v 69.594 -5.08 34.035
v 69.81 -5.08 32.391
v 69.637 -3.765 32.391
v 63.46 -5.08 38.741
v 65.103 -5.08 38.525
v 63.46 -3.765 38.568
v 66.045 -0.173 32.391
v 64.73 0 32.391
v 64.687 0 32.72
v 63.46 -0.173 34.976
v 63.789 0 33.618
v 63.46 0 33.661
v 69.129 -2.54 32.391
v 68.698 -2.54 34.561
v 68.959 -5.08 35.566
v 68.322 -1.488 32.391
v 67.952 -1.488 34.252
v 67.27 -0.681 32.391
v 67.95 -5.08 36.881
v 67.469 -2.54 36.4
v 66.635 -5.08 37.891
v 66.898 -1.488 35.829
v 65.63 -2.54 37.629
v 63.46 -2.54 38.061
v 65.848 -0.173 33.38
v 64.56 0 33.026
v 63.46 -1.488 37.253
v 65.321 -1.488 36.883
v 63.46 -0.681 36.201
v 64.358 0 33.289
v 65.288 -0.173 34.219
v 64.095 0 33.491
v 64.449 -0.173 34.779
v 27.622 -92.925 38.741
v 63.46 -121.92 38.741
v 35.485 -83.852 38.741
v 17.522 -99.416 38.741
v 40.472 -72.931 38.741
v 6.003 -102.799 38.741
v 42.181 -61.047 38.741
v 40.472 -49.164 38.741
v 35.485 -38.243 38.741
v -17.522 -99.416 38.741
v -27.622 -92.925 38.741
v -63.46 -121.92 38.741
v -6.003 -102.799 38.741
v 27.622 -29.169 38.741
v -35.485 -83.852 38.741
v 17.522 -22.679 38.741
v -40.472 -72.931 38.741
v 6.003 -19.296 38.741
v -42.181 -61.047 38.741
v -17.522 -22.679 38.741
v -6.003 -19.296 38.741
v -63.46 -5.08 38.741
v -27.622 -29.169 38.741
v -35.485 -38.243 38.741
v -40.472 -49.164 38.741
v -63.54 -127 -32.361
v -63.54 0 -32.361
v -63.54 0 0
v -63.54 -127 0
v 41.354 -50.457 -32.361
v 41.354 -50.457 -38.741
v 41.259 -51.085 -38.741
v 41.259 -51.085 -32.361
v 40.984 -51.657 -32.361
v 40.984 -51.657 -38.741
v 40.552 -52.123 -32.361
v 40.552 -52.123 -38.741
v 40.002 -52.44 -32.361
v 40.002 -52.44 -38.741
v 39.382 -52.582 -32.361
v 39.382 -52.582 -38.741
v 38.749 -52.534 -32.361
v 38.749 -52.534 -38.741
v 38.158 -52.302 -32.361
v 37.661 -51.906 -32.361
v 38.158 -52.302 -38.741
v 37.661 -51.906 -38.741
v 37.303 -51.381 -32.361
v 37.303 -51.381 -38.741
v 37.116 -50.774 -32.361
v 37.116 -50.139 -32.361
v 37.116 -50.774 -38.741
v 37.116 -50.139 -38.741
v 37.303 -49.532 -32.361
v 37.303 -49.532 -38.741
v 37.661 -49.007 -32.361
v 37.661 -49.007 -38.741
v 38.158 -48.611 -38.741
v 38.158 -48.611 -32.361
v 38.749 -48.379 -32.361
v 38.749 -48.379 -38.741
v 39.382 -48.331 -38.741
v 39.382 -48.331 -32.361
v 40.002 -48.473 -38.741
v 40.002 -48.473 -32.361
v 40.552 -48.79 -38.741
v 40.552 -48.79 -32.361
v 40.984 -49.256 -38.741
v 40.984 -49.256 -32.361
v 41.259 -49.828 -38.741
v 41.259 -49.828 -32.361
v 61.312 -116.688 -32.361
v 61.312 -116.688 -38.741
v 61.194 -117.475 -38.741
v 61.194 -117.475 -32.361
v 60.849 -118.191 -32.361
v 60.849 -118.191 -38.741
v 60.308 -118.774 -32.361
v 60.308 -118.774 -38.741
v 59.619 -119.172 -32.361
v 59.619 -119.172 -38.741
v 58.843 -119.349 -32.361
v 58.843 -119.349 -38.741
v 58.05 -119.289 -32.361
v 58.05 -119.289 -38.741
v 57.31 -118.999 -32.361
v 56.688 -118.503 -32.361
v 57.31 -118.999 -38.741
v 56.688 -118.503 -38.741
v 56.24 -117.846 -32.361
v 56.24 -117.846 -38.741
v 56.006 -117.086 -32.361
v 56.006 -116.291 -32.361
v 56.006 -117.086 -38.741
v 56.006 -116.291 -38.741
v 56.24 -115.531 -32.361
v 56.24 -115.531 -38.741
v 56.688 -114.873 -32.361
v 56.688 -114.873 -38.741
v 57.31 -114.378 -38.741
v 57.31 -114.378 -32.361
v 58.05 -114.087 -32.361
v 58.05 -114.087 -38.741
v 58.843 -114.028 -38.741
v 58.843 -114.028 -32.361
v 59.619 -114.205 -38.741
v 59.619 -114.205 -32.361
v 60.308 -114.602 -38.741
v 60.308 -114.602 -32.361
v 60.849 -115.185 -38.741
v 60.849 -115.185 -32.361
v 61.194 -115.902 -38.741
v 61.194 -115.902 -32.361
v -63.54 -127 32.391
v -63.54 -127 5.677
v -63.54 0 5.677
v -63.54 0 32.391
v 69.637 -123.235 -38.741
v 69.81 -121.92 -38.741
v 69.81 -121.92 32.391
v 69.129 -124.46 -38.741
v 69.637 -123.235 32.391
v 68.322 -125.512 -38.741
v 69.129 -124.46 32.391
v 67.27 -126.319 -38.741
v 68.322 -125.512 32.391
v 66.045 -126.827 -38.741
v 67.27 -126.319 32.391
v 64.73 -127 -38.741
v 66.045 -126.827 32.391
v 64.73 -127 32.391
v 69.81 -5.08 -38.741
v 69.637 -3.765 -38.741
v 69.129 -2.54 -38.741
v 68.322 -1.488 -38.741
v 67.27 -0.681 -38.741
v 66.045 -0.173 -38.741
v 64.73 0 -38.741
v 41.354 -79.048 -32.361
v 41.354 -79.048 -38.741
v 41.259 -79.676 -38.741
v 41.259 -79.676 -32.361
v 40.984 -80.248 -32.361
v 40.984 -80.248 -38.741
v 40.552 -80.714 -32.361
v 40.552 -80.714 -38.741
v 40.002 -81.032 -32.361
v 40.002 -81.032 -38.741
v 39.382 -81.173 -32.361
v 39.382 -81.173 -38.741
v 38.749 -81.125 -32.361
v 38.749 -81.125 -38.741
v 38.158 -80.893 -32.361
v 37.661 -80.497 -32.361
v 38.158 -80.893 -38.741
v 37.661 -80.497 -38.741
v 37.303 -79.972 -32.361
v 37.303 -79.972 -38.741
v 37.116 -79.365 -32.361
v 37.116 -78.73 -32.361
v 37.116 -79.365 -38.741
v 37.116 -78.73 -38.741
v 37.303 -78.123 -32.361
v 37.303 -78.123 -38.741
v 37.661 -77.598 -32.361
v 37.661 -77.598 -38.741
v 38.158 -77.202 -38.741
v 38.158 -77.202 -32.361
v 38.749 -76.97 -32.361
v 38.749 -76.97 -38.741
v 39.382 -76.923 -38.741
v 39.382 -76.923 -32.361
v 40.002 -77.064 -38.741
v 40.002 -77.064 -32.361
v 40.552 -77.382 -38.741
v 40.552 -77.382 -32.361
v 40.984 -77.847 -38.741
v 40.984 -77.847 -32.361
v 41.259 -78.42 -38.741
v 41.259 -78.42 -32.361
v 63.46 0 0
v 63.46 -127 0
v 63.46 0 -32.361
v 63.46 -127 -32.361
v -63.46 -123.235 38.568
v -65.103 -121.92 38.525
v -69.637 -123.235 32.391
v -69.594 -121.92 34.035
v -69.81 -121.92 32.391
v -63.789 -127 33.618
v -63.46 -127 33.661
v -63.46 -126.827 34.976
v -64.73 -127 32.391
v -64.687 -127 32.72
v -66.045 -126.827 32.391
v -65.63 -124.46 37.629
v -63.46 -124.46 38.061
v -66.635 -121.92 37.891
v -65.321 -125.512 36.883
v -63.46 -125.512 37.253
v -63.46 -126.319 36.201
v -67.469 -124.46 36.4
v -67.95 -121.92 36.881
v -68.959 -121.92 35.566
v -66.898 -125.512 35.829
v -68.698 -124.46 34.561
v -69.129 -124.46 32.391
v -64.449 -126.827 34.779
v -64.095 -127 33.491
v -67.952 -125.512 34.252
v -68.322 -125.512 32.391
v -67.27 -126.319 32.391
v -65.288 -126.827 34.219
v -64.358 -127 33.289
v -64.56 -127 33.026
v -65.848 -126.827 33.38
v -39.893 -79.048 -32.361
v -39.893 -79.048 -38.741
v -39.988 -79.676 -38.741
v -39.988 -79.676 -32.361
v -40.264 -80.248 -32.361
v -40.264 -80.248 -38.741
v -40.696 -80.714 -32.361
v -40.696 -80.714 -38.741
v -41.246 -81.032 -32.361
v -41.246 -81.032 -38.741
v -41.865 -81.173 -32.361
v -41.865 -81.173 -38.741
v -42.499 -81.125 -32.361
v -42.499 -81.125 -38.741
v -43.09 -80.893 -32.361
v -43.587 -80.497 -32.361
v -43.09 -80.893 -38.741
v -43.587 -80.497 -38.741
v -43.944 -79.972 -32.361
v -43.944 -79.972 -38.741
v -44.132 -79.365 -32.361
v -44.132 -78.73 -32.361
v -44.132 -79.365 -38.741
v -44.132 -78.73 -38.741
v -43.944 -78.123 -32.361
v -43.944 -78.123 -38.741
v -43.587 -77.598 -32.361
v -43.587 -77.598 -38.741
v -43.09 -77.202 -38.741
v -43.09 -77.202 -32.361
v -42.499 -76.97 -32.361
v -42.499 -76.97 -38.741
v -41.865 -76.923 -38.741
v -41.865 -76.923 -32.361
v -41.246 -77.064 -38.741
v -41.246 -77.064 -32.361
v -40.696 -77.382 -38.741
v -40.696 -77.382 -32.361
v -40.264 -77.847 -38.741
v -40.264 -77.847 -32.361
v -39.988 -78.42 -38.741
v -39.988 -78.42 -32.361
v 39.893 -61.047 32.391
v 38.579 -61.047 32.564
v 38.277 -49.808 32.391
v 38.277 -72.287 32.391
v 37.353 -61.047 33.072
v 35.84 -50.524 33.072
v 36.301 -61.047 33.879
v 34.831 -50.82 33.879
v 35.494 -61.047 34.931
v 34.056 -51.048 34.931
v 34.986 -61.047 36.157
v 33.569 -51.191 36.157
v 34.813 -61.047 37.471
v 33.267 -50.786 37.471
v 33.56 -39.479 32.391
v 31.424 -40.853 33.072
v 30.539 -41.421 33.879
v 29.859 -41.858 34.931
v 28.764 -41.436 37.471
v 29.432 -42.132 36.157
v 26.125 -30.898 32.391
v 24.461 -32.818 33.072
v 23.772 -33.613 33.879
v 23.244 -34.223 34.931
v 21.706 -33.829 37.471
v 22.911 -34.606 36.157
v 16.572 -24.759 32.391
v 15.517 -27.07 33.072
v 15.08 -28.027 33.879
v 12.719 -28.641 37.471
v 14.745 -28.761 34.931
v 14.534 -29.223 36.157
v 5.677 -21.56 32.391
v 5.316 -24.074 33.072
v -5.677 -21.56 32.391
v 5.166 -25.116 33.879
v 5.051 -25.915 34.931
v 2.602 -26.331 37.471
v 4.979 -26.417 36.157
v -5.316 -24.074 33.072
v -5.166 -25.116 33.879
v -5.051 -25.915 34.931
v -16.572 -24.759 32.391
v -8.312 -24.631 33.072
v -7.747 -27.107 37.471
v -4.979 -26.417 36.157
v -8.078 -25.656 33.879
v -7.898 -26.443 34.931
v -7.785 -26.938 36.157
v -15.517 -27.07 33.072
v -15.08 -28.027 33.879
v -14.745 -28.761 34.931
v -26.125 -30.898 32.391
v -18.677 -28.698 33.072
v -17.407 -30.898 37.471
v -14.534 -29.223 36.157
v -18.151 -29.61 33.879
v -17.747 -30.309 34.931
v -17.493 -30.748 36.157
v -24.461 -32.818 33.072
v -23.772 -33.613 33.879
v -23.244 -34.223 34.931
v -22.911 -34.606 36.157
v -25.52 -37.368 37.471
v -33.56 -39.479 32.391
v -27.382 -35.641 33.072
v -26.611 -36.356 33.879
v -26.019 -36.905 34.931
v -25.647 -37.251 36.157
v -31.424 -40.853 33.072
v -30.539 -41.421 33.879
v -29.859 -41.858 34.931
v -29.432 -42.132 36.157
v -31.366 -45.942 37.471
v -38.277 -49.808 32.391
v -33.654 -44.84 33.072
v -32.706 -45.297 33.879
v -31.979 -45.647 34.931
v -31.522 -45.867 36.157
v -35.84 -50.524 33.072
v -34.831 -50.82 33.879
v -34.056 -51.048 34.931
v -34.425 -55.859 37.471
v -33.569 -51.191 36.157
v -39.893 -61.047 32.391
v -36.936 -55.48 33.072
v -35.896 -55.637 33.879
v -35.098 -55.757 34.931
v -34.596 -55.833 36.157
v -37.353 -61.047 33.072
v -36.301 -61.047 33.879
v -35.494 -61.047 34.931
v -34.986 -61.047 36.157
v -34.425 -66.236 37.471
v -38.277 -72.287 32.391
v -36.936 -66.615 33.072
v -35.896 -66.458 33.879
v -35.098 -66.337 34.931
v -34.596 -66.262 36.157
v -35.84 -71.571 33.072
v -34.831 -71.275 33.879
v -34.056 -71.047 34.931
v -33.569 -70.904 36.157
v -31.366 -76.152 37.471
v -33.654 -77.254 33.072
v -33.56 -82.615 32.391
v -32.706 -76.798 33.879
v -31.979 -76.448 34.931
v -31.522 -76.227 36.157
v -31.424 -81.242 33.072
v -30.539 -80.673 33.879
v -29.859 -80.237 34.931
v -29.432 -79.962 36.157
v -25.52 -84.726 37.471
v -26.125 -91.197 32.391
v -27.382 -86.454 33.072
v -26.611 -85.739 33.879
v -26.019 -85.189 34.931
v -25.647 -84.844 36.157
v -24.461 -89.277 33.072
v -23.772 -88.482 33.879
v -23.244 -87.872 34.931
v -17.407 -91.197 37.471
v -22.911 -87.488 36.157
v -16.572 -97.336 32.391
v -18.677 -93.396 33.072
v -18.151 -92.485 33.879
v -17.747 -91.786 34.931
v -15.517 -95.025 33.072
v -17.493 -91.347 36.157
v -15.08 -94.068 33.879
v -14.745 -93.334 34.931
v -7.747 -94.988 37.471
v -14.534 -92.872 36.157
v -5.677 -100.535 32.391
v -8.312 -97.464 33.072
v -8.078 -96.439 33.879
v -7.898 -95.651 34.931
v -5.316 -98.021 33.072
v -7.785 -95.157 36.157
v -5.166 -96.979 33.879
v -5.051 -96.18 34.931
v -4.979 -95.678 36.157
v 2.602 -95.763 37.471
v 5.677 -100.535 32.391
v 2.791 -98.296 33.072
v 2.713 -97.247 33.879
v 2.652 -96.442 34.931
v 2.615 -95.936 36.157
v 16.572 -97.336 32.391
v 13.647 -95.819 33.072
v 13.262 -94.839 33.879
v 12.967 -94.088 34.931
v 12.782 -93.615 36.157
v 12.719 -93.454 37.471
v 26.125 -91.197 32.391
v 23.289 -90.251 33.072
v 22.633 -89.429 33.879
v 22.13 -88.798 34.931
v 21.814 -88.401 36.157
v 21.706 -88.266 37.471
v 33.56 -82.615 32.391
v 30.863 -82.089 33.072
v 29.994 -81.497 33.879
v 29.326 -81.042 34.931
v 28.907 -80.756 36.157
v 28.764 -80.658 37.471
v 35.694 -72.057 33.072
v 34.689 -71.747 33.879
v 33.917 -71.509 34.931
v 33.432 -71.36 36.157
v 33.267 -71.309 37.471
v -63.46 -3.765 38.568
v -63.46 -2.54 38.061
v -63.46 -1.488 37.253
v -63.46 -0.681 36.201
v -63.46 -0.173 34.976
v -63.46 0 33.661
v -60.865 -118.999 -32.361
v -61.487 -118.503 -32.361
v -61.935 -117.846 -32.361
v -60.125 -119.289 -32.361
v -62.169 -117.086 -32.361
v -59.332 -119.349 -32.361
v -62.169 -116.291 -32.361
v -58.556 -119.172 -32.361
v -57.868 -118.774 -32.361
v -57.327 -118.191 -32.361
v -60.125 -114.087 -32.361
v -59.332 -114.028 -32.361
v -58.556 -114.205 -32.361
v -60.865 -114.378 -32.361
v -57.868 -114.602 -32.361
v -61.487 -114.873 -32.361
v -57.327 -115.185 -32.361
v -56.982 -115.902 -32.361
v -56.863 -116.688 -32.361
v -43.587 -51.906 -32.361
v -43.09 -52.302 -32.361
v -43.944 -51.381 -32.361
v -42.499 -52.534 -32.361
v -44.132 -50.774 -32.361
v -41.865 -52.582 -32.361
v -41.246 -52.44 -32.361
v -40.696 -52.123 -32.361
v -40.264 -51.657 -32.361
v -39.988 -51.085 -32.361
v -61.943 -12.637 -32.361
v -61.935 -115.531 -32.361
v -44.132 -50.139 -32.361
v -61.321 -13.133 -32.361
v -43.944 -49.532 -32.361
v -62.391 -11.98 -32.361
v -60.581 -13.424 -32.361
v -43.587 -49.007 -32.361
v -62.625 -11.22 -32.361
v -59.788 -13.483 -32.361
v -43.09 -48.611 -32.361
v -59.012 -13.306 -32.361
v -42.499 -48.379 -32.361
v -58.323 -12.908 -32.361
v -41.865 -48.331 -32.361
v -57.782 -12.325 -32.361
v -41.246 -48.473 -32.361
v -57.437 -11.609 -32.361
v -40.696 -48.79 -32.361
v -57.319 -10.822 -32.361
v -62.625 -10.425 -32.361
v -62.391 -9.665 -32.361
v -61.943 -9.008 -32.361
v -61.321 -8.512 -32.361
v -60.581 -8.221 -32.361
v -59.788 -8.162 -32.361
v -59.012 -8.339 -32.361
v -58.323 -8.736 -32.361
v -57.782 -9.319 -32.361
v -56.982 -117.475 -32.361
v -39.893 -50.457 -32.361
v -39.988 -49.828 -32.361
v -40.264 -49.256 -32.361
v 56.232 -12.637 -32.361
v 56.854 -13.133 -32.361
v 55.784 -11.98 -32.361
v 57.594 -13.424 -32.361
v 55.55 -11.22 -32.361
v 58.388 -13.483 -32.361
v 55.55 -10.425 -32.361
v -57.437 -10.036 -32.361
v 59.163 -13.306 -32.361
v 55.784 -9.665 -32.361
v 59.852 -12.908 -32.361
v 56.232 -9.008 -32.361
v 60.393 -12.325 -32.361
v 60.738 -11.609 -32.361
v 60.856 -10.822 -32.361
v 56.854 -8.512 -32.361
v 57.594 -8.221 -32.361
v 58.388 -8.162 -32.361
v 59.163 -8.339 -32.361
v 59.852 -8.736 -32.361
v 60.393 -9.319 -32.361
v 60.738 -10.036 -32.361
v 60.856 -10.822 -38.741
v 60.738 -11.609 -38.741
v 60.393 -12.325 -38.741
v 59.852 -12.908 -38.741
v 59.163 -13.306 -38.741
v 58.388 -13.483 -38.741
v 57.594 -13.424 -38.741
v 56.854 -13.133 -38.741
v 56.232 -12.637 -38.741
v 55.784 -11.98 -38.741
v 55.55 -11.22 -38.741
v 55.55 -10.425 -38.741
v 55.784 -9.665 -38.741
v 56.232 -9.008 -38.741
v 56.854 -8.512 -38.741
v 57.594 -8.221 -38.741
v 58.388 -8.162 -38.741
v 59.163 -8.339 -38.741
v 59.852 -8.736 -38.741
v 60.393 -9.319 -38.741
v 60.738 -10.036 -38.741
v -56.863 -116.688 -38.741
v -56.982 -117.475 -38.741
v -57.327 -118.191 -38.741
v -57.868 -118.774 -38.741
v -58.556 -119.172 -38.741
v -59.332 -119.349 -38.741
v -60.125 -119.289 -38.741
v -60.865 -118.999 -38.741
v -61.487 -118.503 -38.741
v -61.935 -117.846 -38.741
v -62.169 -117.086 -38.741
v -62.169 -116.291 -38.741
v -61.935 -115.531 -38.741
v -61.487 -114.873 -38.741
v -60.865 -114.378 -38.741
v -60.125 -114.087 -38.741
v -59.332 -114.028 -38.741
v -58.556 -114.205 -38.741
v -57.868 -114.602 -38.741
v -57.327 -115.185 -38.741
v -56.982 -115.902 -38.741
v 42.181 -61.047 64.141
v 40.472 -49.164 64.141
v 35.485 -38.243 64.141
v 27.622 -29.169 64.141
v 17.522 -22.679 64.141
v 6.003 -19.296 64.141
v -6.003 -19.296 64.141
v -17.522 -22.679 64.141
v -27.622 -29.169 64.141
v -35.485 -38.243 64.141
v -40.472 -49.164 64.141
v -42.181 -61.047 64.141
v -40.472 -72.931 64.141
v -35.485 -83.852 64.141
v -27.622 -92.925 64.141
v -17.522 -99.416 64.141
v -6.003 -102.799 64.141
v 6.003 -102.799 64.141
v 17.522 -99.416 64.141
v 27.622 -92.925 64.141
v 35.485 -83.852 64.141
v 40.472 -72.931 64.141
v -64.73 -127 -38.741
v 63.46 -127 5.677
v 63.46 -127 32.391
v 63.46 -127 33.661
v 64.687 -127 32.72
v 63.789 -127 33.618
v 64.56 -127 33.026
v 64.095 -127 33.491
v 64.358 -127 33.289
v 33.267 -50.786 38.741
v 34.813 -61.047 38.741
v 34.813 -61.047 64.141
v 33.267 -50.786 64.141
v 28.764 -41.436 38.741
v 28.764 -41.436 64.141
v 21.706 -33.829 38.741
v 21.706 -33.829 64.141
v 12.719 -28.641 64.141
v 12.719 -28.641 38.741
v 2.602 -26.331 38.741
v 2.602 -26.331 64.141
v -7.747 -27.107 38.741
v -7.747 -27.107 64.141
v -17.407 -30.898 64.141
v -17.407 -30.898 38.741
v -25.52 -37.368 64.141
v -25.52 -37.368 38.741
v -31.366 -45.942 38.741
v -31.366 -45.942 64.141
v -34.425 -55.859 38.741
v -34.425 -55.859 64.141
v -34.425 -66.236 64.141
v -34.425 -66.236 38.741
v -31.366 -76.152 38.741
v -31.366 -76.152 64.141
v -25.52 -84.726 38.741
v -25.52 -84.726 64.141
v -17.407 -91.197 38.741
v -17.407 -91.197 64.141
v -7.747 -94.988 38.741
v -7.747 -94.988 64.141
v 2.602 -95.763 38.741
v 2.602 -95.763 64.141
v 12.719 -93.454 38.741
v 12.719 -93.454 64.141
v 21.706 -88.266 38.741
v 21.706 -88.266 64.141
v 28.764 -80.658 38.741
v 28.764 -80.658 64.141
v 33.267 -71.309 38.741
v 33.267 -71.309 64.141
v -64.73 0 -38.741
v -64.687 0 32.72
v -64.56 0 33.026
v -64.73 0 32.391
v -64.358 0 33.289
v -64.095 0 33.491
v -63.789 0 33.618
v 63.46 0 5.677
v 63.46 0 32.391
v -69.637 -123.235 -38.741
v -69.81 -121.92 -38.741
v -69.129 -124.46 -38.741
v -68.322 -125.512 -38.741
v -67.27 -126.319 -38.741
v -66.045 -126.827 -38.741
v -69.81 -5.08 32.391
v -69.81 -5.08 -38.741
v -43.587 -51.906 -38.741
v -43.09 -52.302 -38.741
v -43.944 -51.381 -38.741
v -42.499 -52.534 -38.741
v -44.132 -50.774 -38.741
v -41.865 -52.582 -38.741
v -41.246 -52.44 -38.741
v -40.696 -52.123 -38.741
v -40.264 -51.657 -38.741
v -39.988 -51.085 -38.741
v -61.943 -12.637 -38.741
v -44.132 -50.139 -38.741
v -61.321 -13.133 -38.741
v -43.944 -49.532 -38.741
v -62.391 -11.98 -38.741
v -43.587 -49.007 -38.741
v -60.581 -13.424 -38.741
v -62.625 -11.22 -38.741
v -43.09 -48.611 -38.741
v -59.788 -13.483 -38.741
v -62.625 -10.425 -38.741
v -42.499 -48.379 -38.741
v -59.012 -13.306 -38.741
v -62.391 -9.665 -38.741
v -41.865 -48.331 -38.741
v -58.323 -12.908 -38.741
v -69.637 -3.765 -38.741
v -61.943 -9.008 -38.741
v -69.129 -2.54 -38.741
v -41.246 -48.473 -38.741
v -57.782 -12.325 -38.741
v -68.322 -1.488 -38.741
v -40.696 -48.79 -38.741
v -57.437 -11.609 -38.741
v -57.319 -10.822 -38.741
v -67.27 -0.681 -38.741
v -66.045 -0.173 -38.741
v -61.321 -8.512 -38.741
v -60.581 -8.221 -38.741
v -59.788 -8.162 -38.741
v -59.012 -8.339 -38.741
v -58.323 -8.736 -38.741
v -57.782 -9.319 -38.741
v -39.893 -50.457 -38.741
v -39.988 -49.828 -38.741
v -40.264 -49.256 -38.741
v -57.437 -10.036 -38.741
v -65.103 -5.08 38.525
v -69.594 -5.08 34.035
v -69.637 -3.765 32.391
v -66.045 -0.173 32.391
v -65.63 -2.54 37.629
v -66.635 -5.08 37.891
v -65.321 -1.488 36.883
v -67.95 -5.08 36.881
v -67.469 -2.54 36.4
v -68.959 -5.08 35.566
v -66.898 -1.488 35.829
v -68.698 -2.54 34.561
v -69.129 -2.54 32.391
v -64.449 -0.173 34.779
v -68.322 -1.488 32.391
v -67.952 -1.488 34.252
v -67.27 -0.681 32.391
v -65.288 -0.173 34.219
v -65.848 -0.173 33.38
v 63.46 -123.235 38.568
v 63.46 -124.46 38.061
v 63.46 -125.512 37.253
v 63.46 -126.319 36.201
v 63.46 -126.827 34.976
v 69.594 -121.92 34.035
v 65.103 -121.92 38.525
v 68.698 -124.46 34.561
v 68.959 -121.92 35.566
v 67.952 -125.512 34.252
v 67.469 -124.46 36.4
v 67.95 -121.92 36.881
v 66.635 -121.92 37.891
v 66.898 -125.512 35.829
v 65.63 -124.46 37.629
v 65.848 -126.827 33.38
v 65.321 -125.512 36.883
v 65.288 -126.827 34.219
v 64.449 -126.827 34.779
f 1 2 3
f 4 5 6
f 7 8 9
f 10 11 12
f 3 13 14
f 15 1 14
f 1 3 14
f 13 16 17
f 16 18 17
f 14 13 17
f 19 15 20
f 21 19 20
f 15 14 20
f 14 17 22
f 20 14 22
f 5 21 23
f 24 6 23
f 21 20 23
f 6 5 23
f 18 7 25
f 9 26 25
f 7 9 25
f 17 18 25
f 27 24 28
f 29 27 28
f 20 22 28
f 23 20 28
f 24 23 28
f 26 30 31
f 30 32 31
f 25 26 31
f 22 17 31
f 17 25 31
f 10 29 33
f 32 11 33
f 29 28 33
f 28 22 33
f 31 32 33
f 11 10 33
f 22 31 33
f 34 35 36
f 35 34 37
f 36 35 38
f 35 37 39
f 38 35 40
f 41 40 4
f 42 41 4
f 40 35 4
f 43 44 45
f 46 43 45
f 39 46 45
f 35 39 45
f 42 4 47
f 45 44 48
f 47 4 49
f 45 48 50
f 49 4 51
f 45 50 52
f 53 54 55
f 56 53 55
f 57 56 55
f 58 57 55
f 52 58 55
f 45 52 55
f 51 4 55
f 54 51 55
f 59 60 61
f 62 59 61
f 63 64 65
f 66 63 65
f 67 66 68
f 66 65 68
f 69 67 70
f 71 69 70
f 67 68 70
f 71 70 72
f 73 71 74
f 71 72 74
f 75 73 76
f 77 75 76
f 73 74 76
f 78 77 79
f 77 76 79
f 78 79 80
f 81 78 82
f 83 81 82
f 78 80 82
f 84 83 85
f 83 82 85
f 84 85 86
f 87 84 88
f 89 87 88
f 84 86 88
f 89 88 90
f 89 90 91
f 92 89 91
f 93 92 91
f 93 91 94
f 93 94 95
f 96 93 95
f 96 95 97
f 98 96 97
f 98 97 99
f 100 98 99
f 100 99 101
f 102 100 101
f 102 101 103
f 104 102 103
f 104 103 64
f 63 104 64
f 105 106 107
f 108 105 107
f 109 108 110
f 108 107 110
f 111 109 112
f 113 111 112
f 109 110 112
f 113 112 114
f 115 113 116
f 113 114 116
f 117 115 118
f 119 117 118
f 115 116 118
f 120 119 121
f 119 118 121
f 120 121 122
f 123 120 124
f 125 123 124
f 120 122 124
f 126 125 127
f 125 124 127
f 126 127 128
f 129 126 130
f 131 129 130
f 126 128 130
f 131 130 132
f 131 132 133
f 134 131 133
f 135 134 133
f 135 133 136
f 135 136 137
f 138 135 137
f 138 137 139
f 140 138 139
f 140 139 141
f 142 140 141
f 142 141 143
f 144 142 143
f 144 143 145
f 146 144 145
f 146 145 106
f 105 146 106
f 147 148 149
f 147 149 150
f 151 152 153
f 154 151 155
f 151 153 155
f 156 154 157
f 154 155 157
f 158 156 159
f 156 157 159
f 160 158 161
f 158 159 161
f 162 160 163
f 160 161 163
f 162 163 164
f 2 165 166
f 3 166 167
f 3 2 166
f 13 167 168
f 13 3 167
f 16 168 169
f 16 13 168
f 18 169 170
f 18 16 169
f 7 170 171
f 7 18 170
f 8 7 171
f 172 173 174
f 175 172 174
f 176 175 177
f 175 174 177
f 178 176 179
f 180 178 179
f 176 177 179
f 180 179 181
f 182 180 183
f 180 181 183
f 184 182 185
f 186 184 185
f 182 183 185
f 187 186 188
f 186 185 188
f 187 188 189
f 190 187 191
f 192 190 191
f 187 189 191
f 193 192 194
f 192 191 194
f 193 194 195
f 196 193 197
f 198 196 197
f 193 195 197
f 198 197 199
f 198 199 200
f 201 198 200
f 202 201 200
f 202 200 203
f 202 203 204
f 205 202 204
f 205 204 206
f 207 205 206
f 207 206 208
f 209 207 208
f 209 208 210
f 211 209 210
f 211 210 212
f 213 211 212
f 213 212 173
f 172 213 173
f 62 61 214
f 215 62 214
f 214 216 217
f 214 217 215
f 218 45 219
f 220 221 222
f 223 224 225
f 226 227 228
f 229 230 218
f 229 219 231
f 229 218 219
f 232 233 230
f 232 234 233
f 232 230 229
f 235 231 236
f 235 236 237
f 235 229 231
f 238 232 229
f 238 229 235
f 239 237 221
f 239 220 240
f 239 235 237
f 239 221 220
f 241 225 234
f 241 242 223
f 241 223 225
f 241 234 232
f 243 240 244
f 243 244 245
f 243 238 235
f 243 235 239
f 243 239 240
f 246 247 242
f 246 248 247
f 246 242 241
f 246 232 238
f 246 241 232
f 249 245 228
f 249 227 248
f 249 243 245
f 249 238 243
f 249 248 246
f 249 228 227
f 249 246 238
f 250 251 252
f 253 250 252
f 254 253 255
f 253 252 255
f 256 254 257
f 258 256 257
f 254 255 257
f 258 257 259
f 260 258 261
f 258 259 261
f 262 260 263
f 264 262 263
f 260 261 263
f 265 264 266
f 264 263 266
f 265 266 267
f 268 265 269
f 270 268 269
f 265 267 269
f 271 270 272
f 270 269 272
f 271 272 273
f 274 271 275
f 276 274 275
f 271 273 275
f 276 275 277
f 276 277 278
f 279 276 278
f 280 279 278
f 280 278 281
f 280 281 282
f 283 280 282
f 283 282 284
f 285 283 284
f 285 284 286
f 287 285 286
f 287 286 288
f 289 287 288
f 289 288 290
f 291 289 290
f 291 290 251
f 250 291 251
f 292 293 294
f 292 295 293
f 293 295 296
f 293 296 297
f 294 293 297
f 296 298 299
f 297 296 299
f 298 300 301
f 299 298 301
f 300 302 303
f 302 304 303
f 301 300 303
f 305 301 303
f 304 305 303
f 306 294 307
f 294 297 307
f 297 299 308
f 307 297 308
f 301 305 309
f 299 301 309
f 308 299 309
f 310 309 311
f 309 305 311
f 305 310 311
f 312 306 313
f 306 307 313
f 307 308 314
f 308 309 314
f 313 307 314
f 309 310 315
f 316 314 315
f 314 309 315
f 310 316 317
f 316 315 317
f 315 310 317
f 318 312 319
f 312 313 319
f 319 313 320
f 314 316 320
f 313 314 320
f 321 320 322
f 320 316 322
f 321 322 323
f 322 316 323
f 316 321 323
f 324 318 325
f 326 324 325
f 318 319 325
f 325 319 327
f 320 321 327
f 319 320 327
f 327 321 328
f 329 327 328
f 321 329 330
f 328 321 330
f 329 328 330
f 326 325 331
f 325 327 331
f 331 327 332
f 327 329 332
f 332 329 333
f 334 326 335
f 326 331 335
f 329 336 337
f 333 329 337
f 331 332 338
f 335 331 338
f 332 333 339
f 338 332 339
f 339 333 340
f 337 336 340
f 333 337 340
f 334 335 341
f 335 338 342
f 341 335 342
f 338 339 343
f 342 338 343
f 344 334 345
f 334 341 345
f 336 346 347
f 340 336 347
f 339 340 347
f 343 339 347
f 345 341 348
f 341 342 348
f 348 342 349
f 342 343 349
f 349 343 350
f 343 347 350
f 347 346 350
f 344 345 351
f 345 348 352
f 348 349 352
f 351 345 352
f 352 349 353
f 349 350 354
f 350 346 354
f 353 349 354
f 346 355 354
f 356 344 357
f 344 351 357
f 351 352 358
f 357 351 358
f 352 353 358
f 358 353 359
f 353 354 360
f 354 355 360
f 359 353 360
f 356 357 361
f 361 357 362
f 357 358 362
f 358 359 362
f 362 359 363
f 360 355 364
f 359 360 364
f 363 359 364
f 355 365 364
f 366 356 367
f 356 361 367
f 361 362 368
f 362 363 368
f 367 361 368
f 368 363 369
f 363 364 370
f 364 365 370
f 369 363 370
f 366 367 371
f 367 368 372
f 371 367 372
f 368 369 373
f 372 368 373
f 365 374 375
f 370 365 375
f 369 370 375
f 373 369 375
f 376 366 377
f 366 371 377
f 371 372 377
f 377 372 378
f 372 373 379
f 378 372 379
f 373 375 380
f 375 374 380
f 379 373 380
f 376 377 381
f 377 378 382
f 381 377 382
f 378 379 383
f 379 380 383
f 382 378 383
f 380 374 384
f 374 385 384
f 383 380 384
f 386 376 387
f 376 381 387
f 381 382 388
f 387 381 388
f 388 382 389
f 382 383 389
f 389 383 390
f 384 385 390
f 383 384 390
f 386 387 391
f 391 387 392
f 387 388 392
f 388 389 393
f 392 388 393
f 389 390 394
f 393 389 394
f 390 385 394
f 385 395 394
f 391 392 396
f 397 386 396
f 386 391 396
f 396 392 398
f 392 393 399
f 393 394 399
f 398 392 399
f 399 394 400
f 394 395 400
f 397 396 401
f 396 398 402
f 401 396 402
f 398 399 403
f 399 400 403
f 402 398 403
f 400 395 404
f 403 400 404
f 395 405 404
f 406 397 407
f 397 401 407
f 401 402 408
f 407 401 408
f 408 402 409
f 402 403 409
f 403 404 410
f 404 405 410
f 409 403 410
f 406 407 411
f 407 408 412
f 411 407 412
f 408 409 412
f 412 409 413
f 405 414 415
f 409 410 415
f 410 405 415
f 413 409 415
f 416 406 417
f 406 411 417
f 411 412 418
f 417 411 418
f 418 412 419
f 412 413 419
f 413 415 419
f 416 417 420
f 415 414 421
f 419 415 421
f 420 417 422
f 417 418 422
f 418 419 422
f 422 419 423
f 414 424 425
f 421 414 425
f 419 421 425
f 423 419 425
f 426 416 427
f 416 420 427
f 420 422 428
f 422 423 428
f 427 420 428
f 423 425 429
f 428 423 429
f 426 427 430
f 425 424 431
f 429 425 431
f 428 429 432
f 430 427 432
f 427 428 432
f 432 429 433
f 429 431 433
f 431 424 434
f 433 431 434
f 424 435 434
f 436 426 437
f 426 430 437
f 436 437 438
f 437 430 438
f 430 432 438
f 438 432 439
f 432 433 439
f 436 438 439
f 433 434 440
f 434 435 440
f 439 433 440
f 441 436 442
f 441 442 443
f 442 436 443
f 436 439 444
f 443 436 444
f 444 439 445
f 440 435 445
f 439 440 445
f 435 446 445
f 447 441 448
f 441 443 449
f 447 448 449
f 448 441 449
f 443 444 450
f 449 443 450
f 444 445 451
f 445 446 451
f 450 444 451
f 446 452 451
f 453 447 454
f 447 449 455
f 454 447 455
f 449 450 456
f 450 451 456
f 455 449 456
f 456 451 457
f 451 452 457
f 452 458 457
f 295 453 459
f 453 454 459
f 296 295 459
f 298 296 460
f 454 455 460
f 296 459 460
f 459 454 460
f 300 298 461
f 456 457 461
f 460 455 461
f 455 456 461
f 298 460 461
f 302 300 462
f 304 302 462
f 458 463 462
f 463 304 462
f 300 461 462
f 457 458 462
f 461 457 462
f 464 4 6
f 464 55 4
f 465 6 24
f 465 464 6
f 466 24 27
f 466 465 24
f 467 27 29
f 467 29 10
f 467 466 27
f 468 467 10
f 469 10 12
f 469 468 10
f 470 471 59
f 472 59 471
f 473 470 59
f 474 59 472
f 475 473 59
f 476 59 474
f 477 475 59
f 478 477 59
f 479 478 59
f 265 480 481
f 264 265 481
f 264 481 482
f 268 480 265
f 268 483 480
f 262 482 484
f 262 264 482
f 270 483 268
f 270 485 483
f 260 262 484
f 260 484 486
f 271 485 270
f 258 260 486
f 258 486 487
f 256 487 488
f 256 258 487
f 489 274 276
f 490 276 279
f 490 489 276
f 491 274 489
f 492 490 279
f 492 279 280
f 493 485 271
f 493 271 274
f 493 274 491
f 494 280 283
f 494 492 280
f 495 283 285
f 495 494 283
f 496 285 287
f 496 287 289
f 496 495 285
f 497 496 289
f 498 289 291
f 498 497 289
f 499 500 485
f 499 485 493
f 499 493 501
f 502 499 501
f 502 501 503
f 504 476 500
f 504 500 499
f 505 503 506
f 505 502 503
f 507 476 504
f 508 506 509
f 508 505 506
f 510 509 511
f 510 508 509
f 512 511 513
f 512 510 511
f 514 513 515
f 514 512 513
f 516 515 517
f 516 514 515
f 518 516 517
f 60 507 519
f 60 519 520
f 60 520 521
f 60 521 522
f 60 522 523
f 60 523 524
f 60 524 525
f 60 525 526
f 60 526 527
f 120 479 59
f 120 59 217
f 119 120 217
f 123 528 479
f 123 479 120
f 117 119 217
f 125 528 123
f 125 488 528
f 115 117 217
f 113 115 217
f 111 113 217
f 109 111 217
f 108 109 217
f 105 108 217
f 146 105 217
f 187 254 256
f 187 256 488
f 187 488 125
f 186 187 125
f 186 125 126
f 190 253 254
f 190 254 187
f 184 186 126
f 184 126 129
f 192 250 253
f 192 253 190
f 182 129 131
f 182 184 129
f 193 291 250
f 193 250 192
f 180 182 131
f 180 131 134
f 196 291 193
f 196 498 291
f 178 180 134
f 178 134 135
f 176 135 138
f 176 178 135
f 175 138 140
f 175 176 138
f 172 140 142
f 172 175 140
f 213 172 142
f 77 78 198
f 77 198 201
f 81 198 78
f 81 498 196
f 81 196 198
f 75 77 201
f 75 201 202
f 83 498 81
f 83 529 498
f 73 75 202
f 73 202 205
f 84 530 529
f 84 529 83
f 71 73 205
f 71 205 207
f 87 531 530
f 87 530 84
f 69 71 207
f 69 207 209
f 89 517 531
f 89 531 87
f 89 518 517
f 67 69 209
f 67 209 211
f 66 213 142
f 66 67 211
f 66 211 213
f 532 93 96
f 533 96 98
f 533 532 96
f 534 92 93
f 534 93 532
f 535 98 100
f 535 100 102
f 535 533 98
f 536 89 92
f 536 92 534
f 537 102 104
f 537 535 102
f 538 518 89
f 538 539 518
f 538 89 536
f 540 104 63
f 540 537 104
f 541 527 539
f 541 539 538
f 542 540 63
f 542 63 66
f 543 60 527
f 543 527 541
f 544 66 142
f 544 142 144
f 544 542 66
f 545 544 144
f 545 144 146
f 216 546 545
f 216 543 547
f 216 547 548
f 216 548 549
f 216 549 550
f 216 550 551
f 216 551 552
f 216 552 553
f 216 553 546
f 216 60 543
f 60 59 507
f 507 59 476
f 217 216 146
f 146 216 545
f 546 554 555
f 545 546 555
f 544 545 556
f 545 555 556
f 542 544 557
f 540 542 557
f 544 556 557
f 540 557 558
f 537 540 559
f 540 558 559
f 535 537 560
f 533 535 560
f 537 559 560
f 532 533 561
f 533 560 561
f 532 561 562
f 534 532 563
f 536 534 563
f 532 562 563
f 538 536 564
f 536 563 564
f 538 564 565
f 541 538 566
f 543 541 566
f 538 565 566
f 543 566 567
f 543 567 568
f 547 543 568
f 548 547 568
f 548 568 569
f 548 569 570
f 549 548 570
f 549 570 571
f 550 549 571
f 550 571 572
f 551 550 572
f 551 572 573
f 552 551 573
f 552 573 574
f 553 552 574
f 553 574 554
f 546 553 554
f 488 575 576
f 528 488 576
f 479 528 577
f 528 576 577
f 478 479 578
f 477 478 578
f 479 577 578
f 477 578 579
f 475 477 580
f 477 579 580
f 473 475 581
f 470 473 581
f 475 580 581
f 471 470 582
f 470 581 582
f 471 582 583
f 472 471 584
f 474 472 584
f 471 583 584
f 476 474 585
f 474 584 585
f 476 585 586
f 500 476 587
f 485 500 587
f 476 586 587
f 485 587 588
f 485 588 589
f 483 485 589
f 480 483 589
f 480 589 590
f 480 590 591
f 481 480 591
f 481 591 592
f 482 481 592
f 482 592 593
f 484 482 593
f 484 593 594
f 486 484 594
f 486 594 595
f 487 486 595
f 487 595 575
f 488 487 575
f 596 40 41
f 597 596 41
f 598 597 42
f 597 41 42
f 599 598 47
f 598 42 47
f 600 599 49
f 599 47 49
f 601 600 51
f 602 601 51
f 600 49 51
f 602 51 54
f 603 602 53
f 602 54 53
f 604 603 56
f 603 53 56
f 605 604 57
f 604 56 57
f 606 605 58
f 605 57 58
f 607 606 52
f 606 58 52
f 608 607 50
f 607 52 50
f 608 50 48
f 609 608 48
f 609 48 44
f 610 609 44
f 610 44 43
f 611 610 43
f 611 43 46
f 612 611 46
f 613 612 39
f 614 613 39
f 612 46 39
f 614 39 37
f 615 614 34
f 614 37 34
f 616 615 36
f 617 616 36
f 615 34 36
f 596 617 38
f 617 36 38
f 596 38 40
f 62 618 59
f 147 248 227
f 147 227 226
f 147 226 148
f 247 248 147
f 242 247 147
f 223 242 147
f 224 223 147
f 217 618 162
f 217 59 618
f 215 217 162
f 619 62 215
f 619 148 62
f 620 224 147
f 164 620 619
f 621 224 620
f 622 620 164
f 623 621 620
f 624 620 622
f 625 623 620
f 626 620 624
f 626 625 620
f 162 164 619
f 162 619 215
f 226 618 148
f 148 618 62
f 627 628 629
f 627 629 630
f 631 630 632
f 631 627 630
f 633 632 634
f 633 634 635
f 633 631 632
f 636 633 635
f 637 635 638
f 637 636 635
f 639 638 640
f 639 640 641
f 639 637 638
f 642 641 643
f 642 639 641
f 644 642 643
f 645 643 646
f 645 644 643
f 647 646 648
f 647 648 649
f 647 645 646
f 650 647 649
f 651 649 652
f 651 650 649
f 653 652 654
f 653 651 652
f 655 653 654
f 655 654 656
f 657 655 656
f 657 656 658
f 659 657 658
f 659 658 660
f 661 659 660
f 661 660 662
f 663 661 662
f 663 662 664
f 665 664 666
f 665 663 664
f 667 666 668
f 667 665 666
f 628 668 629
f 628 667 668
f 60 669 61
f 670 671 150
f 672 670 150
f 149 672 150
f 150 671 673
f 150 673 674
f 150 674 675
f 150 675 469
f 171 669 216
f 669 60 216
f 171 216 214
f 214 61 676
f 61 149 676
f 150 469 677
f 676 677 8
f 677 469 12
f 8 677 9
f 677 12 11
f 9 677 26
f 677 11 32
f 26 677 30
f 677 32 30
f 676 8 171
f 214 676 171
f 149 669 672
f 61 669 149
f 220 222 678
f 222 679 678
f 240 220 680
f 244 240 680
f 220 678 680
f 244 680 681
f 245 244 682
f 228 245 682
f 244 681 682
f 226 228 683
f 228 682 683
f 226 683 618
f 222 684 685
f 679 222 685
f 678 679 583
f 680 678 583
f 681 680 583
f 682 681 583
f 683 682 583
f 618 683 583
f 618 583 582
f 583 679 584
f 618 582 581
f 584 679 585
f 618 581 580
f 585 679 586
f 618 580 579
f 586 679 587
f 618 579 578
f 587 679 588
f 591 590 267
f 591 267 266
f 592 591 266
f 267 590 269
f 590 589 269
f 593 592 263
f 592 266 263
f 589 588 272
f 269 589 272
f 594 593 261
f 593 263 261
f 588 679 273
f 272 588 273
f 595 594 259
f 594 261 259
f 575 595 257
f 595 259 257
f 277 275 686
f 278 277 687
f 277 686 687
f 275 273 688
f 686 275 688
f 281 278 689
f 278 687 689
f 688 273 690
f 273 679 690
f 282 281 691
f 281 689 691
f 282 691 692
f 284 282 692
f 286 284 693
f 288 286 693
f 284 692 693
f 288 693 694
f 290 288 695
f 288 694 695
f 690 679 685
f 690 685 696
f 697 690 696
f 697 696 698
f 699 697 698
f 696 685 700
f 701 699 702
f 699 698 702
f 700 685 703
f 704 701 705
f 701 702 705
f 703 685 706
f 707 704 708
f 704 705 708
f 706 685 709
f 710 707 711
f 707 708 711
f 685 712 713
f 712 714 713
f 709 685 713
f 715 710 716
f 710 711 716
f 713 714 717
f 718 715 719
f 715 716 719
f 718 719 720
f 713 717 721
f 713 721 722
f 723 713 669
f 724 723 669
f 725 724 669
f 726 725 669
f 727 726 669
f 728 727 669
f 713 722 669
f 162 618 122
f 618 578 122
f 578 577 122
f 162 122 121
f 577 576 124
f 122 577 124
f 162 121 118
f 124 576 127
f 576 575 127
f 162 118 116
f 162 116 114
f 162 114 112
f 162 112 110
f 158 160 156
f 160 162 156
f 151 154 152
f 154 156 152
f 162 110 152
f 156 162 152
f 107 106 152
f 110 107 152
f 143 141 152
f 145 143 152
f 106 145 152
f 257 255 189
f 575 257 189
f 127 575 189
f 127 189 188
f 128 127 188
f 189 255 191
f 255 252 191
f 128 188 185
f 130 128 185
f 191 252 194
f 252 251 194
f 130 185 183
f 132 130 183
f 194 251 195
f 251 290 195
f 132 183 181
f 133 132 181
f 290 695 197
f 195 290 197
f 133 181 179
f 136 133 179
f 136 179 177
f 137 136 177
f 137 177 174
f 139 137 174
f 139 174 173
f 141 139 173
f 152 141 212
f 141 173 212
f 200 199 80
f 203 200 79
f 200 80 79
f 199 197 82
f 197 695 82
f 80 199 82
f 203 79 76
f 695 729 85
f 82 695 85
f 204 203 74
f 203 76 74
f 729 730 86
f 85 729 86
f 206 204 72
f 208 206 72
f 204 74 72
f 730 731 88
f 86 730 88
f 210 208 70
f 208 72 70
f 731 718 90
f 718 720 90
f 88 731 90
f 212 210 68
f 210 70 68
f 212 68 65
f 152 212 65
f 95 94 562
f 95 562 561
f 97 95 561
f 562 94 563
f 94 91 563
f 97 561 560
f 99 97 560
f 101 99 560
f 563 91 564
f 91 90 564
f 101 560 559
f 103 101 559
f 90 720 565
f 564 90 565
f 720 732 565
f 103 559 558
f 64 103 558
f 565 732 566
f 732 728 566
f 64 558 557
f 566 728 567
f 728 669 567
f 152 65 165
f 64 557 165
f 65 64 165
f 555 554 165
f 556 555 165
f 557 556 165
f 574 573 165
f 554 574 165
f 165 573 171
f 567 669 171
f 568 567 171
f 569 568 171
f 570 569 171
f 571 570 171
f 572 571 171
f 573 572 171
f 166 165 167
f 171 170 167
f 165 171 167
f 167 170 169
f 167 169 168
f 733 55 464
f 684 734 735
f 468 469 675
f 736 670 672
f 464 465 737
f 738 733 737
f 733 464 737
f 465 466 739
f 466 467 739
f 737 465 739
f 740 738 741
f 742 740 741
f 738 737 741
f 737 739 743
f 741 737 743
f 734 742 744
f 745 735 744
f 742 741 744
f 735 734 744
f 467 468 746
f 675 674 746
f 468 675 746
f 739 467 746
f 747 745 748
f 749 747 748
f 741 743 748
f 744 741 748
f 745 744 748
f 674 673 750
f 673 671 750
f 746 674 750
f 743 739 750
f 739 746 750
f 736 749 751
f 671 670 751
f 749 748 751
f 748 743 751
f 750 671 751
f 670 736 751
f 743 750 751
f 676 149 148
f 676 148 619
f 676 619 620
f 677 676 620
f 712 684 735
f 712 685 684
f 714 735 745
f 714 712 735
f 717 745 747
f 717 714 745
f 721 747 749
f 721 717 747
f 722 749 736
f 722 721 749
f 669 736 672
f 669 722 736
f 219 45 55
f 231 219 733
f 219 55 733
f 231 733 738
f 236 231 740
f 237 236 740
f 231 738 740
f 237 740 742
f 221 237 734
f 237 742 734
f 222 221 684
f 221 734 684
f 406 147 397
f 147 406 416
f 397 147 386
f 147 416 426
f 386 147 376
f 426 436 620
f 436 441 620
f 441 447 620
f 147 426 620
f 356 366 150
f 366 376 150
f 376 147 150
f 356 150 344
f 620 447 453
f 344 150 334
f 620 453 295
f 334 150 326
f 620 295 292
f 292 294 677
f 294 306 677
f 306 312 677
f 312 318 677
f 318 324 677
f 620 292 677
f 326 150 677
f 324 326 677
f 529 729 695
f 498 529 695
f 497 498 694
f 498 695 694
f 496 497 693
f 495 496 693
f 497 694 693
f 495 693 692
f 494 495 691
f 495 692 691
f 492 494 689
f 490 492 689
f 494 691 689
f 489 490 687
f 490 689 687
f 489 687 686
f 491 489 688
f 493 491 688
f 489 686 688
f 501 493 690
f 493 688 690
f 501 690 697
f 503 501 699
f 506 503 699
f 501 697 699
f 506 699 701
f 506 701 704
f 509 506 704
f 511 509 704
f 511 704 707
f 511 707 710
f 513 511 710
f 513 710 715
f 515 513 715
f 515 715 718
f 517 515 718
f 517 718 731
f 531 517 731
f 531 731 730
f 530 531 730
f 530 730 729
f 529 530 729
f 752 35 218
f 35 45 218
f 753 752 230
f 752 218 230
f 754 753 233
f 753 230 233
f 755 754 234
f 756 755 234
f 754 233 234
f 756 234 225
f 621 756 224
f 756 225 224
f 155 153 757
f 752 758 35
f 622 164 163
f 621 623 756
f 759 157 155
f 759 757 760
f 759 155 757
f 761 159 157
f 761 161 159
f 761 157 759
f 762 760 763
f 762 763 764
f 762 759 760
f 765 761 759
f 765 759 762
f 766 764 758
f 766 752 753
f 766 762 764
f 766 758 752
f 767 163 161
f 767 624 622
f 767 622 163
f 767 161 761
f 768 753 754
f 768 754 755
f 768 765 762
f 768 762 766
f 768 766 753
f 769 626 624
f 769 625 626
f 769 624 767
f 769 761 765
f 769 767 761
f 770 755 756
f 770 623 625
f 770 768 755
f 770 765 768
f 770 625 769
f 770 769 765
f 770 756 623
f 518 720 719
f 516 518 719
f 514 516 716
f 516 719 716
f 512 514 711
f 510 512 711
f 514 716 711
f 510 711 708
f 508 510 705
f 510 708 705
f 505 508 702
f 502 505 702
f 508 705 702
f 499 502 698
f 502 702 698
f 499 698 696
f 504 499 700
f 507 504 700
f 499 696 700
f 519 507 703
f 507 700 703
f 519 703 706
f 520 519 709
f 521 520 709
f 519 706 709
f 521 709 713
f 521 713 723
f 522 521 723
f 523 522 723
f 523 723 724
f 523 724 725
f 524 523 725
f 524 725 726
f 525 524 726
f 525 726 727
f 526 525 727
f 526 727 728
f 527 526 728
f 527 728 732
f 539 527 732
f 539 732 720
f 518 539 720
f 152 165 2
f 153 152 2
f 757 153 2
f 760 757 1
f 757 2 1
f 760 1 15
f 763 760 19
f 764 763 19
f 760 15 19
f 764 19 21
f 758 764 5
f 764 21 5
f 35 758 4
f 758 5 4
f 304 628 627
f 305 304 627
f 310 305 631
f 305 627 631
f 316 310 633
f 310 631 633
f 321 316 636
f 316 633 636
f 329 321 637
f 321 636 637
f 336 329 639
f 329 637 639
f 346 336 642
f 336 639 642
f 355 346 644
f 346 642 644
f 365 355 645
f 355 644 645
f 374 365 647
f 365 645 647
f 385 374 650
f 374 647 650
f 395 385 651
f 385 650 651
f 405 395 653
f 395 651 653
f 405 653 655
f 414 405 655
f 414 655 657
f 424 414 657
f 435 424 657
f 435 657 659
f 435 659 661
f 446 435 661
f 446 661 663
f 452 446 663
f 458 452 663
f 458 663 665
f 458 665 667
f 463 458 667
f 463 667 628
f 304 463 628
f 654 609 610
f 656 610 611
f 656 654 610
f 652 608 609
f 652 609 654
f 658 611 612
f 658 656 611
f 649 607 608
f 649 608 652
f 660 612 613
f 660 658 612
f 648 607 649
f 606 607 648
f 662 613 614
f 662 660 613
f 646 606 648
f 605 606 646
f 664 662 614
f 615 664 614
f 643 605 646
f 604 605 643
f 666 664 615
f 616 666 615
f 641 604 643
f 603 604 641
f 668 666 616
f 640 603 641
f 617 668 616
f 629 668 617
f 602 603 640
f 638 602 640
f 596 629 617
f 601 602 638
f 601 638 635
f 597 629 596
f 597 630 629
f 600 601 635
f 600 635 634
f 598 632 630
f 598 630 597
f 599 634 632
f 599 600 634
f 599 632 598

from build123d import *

# Parameters (mm, degrees)
F0_W     = 127
F0_H     = 32.3606841266
F0_H_2   = 26.7147784284
F1_DEPTH = 127
F2_R     = 5.08
F3_R     = 2.1310745611
F4_DEPTH = 25.4
F5_R     = 2.6680723022
F6_DEPTH = 25.4
F7_R     = 42.1805785401
F7_R_2   = 34.8133831429
F8_DEPTH = 25.4
F9_DEPTH = 25.4
F10_R    = 5.08


with BuildPart() as f1:
    # F0 (on Front) → F1 (new body)
    with BuildSketch(Plane.XZ):
        with BuildLine():
            ThreePointArc((69.8099806905, 32.3913091956), (67.950108751, 36.8814372561), (63.4599806905, 38.7413091956))
            Line((63.4599806905, 38.7413091956), (-63.4599806905, 38.7413091956))
            ThreePointArc((-63.4599806905, 38.7413091956), (-67.950108751, 36.8814372561), (-69.8099806905, 32.3913091956))
            Line((-69.8099806905, 32.3913091956), (-69.8099806905, -38.7413091956))
            Line((-69.8099806905, -38.7413091956), (69.8099806905, -38.7413091956))
            Line((69.8099806905, -38.7413091956), (69.8099806905, 32.3913091956))
        make_face()
        with Locations((-0.0400193095, -16.1803420633)):
            Rectangle(F0_W, F0_H, mode=Mode.SUBTRACT)
        with Locations((-0.0400193095, 19.0339199814)):
            Rectangle(F0_W, F0_H_2, mode=Mode.SUBTRACT)
    extrude(amount=F1_DEPTH)

    # F2
    f2_edges = [f1.edges().sort_by_distance(p)[0] for p in [
        (69.809981, -127, -3.175),
        (67.950109, -127, 36.881437),
        (0, -127, 38.741309),
        (-67.950109, -127, 36.881437),
        (-69.809981, -127, -3.175),
        (69.809981, 0, -3.175),
        (67.950109, 0, 36.881437),
        (0, 0, 38.741309),
        (-67.950109, 0, 36.881437),
        (-69.809981, 0, -3.175),
    ]]
    fillet(f2_edges, radius=F2_R)

    # F3 (on face) → F4 (cut)
    with BuildSketch(Plane(origin=(0, 0, -38.7413091956), x_dir=(1, 0, 0), z_dir=(0, 0, -1))):
        with Locations((-42.0244000852, 79.0478363633)):
            Circle(F3_R)
        with Locations((-42.0244000852, 50.4565563633)):
            Circle(F3_R)
        with Locations((39.2230374546, 79.047831549)):
            Circle(F3_R)
        with Locations((39.2230374546, 50.456551549)):
            Circle(F3_R)
    extrude(amount=-F4_DEPTH, mode=Mode.SUBTRACT)

    # F5 (on face) → F6 (cut)
    with BuildSketch(Plane(origin=(0, 0, -38.7413091956), x_dir=(1, 0, 0), z_dir=(0, 0, -1))):
        with Locations((-59.5310516655, 116.688169539)):
            Circle(F5_R)
        with Locations((-59.98695, 10.82233)):
            Circle(F5_R)
        with Locations((58.6440783345, 116.688169539)):
            Circle(F5_R)
        with Locations((58.18818, 10.82233)):
            Circle(F5_R)
    extrude(amount=-F6_DEPTH, mode=Mode.SUBTRACT)

    # F7 (on face) → F8 (join)
    with BuildSketch(Plane.XY.offset(38.7413091956)):
        with Locations((0, -61.0473752022)):
            Circle(F7_R)
        with Locations((0, -61.0473752022)):
            Circle(F7_R_2, mode=Mode.SUBTRACT)
    extrude(amount=F8_DEPTH)

    # F9 (cut): a face of the model
    f9_faces = [f1.faces().sort_by_distance(p)[0] for p in [
        (0, -61.0473752022, 38.7413091956),
    ]]
    extrude(f9_faces, amount=-F9_DEPTH, mode=Mode.SUBTRACT)

    # F10
    f10_edges = [f1.edges().sort_by_distance(p)[0] for p in [
        (-34.813383, -61.047375, 32.391309),
    ]]
    fillet(f10_edges, radius=F10_R)


solid = f1.part
